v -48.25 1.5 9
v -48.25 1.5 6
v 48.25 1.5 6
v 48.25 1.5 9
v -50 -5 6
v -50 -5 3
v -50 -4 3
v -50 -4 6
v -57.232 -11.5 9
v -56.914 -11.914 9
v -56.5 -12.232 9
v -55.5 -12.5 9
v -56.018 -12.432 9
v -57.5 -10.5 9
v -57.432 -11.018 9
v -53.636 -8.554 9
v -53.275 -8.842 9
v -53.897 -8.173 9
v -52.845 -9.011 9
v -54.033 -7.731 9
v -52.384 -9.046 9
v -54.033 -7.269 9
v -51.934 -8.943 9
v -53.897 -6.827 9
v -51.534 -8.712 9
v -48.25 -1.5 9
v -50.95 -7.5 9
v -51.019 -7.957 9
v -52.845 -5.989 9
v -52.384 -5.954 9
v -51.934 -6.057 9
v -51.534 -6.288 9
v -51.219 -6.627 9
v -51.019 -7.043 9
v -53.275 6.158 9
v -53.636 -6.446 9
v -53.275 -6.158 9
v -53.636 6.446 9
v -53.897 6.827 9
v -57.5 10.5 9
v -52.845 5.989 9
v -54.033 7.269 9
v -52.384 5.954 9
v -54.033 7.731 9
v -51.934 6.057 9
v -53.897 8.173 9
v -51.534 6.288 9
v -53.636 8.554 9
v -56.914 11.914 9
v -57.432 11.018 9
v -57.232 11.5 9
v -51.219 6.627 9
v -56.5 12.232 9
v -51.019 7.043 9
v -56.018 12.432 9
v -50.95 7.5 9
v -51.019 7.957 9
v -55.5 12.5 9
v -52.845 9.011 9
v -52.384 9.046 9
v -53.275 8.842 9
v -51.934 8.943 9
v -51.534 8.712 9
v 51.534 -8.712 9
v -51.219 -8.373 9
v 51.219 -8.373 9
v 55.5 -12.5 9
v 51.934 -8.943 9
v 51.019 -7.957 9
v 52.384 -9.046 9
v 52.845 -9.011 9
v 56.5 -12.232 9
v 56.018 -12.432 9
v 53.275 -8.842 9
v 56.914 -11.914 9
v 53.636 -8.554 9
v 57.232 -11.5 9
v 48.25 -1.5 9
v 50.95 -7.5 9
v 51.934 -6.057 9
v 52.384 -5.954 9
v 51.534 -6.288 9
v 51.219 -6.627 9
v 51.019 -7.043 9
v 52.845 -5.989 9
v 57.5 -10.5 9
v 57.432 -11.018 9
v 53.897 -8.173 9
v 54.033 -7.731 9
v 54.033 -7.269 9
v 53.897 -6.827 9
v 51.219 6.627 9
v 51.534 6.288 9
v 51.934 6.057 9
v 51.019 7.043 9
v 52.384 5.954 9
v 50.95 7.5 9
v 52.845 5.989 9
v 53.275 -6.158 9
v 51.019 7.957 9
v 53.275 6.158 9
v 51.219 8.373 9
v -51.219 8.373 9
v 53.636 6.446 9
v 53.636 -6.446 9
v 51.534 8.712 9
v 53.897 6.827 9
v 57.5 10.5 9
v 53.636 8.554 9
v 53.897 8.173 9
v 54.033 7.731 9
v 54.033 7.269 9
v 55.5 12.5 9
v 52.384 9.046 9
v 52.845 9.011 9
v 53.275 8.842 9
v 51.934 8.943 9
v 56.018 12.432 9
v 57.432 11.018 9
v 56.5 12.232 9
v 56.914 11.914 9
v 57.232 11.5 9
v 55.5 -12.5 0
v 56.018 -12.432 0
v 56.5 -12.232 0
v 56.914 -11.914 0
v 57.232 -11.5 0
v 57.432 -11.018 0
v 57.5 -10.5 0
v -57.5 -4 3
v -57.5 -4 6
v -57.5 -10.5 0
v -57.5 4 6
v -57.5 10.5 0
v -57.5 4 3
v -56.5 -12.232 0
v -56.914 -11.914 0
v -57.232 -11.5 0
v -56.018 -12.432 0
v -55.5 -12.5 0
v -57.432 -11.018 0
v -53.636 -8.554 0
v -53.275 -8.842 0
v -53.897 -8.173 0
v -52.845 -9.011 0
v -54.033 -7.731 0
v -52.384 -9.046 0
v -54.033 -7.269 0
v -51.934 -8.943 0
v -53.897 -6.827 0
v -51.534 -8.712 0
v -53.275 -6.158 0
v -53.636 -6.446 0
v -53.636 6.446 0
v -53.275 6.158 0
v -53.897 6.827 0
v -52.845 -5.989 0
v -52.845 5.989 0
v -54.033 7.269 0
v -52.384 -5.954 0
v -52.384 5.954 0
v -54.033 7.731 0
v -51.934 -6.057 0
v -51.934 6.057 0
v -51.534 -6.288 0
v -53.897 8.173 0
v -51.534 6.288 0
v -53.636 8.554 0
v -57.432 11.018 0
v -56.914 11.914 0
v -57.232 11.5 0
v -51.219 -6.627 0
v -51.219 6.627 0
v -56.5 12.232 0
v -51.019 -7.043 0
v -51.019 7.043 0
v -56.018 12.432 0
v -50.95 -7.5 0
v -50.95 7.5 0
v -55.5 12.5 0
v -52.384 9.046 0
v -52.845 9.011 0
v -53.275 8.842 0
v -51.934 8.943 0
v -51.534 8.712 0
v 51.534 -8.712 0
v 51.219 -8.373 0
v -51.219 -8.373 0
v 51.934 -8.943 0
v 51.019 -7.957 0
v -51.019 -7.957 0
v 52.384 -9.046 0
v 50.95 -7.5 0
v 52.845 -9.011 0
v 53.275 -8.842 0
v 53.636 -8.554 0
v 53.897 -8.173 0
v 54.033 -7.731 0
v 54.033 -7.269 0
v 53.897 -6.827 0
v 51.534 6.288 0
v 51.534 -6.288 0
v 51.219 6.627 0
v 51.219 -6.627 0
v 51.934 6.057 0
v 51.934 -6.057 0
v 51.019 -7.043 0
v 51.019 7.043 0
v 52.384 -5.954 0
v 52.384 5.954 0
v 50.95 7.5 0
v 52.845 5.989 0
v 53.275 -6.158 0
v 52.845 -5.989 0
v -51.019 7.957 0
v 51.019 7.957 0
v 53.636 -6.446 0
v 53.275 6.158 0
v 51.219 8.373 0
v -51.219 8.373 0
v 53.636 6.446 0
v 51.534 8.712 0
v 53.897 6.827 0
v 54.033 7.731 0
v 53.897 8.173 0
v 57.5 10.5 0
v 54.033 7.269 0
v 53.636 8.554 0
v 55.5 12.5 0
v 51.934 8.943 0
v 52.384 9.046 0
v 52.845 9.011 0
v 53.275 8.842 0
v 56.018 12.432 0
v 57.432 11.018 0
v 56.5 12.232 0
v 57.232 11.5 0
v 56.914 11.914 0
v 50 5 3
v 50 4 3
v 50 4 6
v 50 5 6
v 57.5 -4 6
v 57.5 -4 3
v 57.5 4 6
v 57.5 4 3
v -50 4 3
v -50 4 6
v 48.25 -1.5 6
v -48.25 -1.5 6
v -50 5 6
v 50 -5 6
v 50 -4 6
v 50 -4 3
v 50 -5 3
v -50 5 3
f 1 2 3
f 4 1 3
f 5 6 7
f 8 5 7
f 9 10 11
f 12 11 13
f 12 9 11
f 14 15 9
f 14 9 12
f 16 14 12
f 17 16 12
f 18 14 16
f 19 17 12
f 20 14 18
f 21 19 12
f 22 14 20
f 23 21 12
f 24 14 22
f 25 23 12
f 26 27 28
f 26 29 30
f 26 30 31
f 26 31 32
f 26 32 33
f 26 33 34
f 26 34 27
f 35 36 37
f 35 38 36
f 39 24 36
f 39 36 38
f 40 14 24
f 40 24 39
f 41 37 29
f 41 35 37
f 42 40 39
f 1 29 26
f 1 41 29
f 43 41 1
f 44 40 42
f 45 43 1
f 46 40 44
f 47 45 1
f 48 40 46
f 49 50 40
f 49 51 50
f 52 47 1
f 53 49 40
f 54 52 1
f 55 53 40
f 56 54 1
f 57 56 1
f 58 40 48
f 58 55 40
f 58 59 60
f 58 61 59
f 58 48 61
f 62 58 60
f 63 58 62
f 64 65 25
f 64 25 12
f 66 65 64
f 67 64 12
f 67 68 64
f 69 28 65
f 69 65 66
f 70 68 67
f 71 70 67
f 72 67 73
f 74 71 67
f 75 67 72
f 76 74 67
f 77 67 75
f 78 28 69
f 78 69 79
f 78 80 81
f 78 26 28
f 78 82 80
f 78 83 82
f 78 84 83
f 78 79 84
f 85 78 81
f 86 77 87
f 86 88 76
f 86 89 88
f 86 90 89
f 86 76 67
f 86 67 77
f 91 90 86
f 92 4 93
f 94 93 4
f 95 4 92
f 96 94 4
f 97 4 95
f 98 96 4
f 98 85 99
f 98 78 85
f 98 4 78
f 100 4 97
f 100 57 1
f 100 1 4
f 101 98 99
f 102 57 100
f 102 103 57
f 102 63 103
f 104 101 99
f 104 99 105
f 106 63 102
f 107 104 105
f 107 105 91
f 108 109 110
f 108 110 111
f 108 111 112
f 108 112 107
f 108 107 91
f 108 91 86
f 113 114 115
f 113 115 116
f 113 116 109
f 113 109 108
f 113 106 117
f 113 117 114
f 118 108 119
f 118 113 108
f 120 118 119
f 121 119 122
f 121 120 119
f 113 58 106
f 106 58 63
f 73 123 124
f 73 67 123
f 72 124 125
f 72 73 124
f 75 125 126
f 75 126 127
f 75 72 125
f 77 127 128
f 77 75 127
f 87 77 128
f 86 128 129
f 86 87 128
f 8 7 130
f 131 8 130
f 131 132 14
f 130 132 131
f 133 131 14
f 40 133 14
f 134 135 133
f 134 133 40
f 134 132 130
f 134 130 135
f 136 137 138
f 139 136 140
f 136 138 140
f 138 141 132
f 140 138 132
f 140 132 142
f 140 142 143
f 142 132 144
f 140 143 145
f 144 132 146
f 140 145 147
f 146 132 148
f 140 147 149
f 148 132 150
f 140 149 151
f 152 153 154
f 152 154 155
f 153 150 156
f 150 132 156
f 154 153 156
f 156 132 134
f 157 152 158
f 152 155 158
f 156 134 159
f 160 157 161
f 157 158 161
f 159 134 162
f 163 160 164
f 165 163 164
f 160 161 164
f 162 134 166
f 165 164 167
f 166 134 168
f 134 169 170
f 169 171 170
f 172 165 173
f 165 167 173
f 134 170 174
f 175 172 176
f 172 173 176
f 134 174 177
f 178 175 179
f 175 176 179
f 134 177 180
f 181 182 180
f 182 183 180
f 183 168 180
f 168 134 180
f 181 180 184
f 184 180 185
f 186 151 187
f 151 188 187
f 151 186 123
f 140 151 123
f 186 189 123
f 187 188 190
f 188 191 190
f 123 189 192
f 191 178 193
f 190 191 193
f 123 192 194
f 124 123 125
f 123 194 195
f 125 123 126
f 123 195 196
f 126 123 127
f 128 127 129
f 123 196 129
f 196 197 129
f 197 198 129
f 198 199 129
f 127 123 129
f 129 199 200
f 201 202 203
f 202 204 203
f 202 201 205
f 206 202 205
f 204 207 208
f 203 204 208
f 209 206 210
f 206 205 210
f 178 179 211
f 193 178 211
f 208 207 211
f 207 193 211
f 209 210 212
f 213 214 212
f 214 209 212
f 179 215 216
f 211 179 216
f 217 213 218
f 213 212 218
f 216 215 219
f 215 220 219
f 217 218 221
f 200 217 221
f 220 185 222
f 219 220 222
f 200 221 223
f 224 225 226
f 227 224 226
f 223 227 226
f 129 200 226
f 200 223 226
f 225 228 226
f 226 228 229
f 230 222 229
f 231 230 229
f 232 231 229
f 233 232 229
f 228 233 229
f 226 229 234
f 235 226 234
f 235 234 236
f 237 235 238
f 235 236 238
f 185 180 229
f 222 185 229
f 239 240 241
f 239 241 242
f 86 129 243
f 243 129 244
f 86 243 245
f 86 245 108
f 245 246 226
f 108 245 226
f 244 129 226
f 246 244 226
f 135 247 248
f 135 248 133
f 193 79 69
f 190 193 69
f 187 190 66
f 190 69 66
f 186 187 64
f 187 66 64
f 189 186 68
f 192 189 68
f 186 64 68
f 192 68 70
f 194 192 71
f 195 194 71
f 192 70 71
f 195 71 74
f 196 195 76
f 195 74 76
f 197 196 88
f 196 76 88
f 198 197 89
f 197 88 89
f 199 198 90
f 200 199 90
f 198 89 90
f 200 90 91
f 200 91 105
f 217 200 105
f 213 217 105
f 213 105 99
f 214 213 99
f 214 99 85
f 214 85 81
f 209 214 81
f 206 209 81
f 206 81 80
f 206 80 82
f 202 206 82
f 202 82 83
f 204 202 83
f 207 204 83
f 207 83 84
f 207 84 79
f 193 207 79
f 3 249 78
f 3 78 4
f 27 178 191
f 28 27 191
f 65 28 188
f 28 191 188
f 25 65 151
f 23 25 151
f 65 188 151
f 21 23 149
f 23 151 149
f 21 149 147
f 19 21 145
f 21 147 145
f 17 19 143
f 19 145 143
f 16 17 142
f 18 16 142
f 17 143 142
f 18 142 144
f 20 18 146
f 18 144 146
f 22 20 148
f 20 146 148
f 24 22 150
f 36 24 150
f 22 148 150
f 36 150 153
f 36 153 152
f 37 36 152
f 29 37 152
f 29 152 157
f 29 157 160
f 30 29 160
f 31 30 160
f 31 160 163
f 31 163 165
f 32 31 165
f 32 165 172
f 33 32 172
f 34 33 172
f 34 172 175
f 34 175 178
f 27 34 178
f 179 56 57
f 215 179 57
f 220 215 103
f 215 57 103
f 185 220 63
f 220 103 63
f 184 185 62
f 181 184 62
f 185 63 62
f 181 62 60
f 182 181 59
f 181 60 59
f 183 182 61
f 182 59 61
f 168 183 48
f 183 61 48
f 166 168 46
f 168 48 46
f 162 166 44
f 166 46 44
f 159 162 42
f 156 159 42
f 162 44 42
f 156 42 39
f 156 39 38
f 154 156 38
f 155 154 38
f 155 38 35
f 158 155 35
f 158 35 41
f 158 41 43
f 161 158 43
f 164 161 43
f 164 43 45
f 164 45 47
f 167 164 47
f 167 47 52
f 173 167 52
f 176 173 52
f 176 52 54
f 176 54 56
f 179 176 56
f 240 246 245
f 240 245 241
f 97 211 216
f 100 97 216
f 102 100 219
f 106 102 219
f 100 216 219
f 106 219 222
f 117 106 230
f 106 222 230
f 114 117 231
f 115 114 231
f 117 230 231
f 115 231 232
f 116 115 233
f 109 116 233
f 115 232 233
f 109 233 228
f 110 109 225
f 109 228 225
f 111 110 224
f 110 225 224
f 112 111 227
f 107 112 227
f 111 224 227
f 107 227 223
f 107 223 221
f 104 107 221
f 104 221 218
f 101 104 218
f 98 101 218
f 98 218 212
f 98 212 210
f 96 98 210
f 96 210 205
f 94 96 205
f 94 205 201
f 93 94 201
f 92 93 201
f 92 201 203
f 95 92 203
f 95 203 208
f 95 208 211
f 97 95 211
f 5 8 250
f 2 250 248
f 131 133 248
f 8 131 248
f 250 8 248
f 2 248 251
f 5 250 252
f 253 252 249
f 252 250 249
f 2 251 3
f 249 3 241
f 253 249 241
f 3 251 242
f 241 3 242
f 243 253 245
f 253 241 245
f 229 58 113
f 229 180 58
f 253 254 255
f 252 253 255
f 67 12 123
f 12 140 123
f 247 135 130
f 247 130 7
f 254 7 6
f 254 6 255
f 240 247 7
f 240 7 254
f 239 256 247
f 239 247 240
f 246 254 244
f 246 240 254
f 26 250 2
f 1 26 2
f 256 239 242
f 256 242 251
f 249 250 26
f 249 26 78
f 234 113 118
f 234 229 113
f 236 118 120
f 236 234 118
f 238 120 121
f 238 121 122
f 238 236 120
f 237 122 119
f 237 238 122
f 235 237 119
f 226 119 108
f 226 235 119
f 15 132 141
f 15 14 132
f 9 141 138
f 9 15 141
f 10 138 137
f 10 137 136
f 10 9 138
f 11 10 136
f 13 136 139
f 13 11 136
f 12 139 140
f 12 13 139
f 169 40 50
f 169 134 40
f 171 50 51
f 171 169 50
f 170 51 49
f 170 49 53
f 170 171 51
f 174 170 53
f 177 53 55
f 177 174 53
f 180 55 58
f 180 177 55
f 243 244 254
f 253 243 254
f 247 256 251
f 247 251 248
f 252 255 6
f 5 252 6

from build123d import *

# Parameters (mm, degrees)
SKETCH_W              = 115
SKETCH_H              = 25
PAD_DEPTH             = 3
PAD001_DEPTH          = 3
SKETCH002_W           = 115
SKETCH002_H           = 25
SKETCH002_W_2         = 96.5
SKETCH002_H_2         = 3
PAD002_DEPTH          = 3
SKETCH003_R           = 1.55
POCKET_DEPTH          = 245.060315
POLARPATTERN_COUNT    = 2
POLARPATTERN001_COUNT = 2
POLARPATTERN002_COUNT = 2
FILLET_R              = 2


with BuildPart() as part:
    # Sketch → Pad (new body)
    with BuildSketch(Plane.XY):
        Rectangle(SKETCH_W, SKETCH_H)
    extrude(amount=PAD_DEPTH)

    # Sketch001 (on Face6 of Pad) → Pad001 (join)
    with BuildSketch(Plane.XY.offset(3)):
        Polygon((-57.5, 12.5), (57.5, 12.5), (57.5, 4), (50, 4), (50, 5), (-50, 5), (-50, 4), (-57.5, 4), align=None)
        Polygon((-57.5, -12.5), (57.5, -12.5), (57.5, -4), (50, -4), (50, -5), (-50, -5), (-50, -4), (-57.5, -4), align=None)
    extrude(amount=PAD001_DEPTH)

    # Sketch002 (on Face12 of Pad001) → Pad002 (join)
    with BuildSketch(Plane.XY.offset(6)):
        Rectangle(SKETCH002_W, SKETCH002_H)
        Rectangle(SKETCH002_W_2, SKETCH002_H_2, mode=Mode.SUBTRACT)
    extrude(amount=PAD002_DEPTH)

    # Sketch003 (on Face26 of Pad002) → Pocket (cut, through all)
    with BuildSketch(Plane.XY.offset(9)):
        with Locations((-52.5, 7.5)):
            Circle(SKETCH003_R)
    pocket = extrude(amount=-POCKET_DEPTH, mode=Mode.SUBTRACT)

    # PolarPattern: Pocket ×2 about axis
    polarpattern_axis = Axis((0, 0, 0), (0, 1, 0))
    for i in range(1, POLARPATTERN_COUNT):
        add(pocket.rotate(polarpattern_axis, i * 360 / POLARPATTERN_COUNT), mode=Mode.SUBTRACT)

    # PolarPattern001: Pocket ×2 about axis
    polarpattern001_axis = Axis((0, 0, 0), (1, 0, 0))
    for i in range(1, POLARPATTERN001_COUNT):
        add(pocket.rotate(polarpattern001_axis, i * 360 / POLARPATTERN001_COUNT), mode=Mode.SUBTRACT)

    # PolarPattern002: Pocket ×2 about axis
    polarpattern002_axis = Axis((0, 0, 9), (0, 0, 1))
    for i in range(1, POLARPATTERN002_COUNT):
        add(pocket.rotate(polarpattern002_axis, i * 360 / POLARPATTERN002_COUNT), mode=Mode.SUBTRACT)

    # Fillet
    fillet_edges = [part.edges().sort_by_distance(p)[0] for p in [
        (57.5, 12.5, 7.5),
        (57.5, 12.5, 4.5),
        (57.5, 12.5, 1.5),
        (57.5, -12.5, 7.5),
        (-57.5, 12.5, 7.5),
        (-57.5, -12.5, 7.5),
    ]]
    fillet(fillet_edges, radius=FILLET_R)


solid = part.part
